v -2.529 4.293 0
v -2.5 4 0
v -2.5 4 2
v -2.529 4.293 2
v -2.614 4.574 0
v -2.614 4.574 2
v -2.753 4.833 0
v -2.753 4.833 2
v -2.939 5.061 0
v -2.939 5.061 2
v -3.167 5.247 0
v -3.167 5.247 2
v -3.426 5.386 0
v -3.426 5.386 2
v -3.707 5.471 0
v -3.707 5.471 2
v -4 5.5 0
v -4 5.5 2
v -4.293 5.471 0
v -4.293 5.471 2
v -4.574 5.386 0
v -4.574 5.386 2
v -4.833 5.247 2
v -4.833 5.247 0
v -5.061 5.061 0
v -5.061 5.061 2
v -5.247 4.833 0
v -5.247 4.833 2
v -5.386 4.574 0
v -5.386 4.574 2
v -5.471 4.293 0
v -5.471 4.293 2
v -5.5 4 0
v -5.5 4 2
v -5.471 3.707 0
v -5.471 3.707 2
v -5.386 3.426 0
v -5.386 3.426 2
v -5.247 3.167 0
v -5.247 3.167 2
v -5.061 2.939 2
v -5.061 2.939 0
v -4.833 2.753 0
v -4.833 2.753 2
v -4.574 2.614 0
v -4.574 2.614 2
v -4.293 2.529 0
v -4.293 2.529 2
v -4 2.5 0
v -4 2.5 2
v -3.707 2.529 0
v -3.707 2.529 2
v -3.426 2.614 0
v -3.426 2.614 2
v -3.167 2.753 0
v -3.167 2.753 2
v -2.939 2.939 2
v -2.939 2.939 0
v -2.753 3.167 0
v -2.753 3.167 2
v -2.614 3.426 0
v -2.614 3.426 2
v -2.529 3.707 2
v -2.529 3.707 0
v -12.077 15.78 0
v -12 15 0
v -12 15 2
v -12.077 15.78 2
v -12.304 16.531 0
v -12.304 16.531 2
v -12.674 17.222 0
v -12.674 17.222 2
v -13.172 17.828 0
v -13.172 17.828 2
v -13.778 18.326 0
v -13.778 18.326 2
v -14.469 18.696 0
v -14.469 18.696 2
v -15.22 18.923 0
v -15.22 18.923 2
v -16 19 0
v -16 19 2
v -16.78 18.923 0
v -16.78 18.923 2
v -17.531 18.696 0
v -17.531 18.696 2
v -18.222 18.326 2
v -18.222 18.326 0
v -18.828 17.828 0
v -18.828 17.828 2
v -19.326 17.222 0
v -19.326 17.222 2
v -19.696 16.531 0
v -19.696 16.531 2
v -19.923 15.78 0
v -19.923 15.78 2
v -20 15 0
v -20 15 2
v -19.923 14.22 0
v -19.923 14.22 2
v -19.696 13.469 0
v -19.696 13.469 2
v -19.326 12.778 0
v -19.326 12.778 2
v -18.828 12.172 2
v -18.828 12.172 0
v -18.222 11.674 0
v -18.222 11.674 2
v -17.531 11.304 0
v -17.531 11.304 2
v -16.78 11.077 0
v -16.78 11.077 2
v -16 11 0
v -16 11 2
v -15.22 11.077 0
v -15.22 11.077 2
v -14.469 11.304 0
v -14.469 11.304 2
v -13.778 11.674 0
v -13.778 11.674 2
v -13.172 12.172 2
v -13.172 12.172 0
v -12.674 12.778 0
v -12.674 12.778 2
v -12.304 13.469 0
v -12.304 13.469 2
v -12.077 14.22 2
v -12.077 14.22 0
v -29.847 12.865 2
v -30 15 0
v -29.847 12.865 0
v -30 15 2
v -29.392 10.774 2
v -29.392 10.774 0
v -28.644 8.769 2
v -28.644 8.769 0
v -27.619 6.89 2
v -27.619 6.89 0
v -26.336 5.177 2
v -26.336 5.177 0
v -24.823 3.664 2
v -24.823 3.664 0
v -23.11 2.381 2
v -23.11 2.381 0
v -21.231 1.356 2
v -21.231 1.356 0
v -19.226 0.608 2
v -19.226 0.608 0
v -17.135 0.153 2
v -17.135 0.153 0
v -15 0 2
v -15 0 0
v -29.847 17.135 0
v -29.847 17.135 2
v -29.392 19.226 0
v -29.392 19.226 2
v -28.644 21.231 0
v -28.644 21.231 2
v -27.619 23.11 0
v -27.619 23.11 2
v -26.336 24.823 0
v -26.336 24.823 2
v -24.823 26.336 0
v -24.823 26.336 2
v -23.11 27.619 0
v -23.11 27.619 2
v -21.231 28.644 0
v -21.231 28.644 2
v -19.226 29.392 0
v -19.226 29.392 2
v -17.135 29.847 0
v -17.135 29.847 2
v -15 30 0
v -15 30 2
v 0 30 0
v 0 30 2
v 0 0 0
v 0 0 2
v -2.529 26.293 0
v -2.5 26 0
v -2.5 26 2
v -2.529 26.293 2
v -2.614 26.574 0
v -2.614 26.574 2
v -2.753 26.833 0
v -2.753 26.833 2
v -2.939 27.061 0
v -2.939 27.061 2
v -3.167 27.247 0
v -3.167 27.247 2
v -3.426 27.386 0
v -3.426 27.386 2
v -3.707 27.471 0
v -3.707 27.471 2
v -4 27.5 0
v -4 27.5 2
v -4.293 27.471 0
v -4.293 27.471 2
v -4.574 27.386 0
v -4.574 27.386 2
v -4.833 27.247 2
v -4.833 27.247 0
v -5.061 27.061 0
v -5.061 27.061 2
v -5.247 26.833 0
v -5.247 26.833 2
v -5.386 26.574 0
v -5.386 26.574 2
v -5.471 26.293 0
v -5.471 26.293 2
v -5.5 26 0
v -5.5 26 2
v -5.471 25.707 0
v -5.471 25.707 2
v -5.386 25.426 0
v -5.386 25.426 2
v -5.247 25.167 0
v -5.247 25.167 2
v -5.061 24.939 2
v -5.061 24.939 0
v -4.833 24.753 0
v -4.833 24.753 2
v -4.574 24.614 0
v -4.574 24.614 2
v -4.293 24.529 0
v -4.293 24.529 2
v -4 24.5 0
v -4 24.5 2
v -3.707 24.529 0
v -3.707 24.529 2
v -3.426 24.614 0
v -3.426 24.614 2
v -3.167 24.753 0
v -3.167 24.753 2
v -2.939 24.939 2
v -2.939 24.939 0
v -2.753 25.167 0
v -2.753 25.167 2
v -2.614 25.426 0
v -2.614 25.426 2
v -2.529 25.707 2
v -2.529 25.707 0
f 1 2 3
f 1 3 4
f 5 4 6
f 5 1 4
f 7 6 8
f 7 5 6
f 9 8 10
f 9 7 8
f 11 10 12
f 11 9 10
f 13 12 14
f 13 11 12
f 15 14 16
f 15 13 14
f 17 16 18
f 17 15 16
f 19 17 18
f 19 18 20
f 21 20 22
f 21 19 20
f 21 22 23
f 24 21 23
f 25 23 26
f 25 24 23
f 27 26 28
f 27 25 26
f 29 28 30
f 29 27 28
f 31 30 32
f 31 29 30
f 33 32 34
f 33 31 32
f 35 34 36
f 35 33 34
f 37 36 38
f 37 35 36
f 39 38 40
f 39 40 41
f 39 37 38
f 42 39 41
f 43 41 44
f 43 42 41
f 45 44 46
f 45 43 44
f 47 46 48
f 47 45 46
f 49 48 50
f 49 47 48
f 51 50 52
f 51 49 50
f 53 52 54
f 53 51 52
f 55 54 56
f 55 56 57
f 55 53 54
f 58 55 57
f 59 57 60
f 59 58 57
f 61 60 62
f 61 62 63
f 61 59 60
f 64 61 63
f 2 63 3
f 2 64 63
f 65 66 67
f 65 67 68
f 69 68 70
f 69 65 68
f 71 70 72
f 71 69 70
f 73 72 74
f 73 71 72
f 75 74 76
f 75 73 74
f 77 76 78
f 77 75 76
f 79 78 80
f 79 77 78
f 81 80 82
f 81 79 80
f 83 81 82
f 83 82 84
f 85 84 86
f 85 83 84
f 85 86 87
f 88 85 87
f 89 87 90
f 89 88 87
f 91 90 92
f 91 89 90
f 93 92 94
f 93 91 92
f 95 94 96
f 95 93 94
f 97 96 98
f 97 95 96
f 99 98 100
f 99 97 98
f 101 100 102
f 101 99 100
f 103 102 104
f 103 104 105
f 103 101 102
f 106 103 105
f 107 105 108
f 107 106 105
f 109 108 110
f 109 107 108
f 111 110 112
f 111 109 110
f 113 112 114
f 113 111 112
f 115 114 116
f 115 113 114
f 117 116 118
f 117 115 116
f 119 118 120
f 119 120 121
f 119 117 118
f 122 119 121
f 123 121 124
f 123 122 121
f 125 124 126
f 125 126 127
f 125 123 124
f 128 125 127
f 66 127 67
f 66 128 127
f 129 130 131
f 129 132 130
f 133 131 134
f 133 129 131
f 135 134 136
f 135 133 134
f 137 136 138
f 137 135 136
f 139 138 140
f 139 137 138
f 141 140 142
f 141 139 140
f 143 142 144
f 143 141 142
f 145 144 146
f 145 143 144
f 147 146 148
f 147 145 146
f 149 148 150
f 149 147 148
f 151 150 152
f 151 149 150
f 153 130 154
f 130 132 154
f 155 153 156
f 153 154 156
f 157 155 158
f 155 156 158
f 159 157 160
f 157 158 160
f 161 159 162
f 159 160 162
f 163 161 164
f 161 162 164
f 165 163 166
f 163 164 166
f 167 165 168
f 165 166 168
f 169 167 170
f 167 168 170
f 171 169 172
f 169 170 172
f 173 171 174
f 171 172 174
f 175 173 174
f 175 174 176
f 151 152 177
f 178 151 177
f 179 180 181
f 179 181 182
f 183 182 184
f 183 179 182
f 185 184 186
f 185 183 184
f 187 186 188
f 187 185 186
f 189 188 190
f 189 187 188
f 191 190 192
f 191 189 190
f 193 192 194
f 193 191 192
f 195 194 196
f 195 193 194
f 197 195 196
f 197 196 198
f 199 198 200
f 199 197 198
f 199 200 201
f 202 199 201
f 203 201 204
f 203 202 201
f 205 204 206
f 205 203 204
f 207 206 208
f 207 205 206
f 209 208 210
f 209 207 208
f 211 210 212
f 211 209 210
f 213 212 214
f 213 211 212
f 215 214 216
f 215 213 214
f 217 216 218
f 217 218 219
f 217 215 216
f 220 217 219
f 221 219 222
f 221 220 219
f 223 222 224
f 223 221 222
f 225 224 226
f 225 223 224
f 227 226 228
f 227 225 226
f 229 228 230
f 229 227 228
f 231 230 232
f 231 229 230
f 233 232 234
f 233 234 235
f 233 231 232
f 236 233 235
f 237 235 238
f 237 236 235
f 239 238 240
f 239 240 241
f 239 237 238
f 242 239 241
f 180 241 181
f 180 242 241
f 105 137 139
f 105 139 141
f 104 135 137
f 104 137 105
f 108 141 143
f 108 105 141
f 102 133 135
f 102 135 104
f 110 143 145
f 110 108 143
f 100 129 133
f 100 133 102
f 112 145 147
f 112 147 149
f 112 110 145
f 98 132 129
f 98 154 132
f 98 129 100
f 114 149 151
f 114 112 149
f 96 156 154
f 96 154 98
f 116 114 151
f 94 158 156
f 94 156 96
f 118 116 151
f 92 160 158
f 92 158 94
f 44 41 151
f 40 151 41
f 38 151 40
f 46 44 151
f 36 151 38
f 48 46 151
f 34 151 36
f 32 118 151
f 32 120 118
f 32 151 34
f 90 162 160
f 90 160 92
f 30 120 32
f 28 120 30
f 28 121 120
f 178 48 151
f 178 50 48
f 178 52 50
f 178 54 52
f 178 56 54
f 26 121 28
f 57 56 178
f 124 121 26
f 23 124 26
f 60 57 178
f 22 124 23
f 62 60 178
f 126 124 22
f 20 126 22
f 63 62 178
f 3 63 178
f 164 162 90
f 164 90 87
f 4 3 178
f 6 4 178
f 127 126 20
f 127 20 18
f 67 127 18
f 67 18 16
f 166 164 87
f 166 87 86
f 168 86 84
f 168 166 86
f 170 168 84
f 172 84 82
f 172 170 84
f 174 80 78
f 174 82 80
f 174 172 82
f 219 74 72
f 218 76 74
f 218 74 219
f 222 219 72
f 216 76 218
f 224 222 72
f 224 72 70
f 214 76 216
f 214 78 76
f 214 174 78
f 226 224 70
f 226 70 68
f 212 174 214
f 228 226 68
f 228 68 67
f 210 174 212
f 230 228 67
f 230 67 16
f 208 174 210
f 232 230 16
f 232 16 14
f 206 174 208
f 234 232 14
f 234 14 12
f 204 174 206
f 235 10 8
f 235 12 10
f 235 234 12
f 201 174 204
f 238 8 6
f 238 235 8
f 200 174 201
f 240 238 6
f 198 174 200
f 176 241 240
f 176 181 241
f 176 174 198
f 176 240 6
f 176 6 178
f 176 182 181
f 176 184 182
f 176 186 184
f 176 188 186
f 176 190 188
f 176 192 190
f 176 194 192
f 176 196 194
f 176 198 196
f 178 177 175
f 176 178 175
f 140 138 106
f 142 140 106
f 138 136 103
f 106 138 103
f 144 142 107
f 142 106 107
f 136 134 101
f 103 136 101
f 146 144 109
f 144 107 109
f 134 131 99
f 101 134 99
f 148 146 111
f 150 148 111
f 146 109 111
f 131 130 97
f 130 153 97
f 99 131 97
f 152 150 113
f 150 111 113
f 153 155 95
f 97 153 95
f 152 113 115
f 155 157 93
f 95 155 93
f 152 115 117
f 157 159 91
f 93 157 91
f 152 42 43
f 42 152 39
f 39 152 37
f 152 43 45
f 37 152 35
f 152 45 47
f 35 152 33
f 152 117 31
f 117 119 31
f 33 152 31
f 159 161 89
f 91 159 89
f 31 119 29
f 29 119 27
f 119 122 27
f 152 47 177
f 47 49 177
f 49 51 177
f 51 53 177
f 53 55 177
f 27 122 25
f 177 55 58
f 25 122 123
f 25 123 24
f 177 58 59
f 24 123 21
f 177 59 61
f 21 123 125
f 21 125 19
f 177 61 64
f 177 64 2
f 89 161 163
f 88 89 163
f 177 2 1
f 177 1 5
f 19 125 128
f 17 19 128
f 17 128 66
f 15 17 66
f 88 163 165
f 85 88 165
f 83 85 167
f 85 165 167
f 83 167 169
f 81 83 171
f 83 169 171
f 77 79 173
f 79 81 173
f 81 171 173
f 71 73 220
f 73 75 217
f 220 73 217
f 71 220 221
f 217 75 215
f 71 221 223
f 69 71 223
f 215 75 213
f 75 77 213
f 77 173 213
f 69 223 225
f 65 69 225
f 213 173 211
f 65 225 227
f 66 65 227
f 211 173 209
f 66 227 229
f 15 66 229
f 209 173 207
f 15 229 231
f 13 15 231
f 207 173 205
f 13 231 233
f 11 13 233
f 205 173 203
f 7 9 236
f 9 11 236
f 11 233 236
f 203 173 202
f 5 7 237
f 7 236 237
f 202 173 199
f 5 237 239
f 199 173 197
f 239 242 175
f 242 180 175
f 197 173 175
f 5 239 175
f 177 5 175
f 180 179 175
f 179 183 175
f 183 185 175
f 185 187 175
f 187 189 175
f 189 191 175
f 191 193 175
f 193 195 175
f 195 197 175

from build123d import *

# Parameters (mm, degrees)
F0_W     = 30
F0_H     = 30
F0_R     = 1.5
F0_R_2   = 4
F1_DEPTH = 2
F2_R     = 14.99999


# Not quite as in the source:
# - a fillet or chamfer is up to 0.001 mm smaller than in the source, because OpenCascade refuses the exact size


with BuildPart() as f1:
    # F0 (on Top) → F1 (new body)
    with BuildSketch(Plane.XY):
        with Locations((-15, 15)):
            Rectangle(F0_W, F0_H)
        with Locations((-4, 4)):
            Circle(F0_R, mode=Mode.SUBTRACT)
        with Locations((-16, 15)):
            Circle(F0_R_2, mode=Mode.SUBTRACT)
        with Locations((-4, 26)):
            Circle(F0_R, mode=Mode.SUBTRACT)
    extrude(amount=F1_DEPTH)

    # F2 (radius 15 in the source; OpenCascade refuses exactly that, so slightly less here)
    f2_edges = [f1.edges().sort_by_distance(p)[0] for p in [
        (-30, 0, 1),
        (-30, 30, 1),
    ]]
    fillet(f2_edges, radius=F2_R)


solid = f1.part
